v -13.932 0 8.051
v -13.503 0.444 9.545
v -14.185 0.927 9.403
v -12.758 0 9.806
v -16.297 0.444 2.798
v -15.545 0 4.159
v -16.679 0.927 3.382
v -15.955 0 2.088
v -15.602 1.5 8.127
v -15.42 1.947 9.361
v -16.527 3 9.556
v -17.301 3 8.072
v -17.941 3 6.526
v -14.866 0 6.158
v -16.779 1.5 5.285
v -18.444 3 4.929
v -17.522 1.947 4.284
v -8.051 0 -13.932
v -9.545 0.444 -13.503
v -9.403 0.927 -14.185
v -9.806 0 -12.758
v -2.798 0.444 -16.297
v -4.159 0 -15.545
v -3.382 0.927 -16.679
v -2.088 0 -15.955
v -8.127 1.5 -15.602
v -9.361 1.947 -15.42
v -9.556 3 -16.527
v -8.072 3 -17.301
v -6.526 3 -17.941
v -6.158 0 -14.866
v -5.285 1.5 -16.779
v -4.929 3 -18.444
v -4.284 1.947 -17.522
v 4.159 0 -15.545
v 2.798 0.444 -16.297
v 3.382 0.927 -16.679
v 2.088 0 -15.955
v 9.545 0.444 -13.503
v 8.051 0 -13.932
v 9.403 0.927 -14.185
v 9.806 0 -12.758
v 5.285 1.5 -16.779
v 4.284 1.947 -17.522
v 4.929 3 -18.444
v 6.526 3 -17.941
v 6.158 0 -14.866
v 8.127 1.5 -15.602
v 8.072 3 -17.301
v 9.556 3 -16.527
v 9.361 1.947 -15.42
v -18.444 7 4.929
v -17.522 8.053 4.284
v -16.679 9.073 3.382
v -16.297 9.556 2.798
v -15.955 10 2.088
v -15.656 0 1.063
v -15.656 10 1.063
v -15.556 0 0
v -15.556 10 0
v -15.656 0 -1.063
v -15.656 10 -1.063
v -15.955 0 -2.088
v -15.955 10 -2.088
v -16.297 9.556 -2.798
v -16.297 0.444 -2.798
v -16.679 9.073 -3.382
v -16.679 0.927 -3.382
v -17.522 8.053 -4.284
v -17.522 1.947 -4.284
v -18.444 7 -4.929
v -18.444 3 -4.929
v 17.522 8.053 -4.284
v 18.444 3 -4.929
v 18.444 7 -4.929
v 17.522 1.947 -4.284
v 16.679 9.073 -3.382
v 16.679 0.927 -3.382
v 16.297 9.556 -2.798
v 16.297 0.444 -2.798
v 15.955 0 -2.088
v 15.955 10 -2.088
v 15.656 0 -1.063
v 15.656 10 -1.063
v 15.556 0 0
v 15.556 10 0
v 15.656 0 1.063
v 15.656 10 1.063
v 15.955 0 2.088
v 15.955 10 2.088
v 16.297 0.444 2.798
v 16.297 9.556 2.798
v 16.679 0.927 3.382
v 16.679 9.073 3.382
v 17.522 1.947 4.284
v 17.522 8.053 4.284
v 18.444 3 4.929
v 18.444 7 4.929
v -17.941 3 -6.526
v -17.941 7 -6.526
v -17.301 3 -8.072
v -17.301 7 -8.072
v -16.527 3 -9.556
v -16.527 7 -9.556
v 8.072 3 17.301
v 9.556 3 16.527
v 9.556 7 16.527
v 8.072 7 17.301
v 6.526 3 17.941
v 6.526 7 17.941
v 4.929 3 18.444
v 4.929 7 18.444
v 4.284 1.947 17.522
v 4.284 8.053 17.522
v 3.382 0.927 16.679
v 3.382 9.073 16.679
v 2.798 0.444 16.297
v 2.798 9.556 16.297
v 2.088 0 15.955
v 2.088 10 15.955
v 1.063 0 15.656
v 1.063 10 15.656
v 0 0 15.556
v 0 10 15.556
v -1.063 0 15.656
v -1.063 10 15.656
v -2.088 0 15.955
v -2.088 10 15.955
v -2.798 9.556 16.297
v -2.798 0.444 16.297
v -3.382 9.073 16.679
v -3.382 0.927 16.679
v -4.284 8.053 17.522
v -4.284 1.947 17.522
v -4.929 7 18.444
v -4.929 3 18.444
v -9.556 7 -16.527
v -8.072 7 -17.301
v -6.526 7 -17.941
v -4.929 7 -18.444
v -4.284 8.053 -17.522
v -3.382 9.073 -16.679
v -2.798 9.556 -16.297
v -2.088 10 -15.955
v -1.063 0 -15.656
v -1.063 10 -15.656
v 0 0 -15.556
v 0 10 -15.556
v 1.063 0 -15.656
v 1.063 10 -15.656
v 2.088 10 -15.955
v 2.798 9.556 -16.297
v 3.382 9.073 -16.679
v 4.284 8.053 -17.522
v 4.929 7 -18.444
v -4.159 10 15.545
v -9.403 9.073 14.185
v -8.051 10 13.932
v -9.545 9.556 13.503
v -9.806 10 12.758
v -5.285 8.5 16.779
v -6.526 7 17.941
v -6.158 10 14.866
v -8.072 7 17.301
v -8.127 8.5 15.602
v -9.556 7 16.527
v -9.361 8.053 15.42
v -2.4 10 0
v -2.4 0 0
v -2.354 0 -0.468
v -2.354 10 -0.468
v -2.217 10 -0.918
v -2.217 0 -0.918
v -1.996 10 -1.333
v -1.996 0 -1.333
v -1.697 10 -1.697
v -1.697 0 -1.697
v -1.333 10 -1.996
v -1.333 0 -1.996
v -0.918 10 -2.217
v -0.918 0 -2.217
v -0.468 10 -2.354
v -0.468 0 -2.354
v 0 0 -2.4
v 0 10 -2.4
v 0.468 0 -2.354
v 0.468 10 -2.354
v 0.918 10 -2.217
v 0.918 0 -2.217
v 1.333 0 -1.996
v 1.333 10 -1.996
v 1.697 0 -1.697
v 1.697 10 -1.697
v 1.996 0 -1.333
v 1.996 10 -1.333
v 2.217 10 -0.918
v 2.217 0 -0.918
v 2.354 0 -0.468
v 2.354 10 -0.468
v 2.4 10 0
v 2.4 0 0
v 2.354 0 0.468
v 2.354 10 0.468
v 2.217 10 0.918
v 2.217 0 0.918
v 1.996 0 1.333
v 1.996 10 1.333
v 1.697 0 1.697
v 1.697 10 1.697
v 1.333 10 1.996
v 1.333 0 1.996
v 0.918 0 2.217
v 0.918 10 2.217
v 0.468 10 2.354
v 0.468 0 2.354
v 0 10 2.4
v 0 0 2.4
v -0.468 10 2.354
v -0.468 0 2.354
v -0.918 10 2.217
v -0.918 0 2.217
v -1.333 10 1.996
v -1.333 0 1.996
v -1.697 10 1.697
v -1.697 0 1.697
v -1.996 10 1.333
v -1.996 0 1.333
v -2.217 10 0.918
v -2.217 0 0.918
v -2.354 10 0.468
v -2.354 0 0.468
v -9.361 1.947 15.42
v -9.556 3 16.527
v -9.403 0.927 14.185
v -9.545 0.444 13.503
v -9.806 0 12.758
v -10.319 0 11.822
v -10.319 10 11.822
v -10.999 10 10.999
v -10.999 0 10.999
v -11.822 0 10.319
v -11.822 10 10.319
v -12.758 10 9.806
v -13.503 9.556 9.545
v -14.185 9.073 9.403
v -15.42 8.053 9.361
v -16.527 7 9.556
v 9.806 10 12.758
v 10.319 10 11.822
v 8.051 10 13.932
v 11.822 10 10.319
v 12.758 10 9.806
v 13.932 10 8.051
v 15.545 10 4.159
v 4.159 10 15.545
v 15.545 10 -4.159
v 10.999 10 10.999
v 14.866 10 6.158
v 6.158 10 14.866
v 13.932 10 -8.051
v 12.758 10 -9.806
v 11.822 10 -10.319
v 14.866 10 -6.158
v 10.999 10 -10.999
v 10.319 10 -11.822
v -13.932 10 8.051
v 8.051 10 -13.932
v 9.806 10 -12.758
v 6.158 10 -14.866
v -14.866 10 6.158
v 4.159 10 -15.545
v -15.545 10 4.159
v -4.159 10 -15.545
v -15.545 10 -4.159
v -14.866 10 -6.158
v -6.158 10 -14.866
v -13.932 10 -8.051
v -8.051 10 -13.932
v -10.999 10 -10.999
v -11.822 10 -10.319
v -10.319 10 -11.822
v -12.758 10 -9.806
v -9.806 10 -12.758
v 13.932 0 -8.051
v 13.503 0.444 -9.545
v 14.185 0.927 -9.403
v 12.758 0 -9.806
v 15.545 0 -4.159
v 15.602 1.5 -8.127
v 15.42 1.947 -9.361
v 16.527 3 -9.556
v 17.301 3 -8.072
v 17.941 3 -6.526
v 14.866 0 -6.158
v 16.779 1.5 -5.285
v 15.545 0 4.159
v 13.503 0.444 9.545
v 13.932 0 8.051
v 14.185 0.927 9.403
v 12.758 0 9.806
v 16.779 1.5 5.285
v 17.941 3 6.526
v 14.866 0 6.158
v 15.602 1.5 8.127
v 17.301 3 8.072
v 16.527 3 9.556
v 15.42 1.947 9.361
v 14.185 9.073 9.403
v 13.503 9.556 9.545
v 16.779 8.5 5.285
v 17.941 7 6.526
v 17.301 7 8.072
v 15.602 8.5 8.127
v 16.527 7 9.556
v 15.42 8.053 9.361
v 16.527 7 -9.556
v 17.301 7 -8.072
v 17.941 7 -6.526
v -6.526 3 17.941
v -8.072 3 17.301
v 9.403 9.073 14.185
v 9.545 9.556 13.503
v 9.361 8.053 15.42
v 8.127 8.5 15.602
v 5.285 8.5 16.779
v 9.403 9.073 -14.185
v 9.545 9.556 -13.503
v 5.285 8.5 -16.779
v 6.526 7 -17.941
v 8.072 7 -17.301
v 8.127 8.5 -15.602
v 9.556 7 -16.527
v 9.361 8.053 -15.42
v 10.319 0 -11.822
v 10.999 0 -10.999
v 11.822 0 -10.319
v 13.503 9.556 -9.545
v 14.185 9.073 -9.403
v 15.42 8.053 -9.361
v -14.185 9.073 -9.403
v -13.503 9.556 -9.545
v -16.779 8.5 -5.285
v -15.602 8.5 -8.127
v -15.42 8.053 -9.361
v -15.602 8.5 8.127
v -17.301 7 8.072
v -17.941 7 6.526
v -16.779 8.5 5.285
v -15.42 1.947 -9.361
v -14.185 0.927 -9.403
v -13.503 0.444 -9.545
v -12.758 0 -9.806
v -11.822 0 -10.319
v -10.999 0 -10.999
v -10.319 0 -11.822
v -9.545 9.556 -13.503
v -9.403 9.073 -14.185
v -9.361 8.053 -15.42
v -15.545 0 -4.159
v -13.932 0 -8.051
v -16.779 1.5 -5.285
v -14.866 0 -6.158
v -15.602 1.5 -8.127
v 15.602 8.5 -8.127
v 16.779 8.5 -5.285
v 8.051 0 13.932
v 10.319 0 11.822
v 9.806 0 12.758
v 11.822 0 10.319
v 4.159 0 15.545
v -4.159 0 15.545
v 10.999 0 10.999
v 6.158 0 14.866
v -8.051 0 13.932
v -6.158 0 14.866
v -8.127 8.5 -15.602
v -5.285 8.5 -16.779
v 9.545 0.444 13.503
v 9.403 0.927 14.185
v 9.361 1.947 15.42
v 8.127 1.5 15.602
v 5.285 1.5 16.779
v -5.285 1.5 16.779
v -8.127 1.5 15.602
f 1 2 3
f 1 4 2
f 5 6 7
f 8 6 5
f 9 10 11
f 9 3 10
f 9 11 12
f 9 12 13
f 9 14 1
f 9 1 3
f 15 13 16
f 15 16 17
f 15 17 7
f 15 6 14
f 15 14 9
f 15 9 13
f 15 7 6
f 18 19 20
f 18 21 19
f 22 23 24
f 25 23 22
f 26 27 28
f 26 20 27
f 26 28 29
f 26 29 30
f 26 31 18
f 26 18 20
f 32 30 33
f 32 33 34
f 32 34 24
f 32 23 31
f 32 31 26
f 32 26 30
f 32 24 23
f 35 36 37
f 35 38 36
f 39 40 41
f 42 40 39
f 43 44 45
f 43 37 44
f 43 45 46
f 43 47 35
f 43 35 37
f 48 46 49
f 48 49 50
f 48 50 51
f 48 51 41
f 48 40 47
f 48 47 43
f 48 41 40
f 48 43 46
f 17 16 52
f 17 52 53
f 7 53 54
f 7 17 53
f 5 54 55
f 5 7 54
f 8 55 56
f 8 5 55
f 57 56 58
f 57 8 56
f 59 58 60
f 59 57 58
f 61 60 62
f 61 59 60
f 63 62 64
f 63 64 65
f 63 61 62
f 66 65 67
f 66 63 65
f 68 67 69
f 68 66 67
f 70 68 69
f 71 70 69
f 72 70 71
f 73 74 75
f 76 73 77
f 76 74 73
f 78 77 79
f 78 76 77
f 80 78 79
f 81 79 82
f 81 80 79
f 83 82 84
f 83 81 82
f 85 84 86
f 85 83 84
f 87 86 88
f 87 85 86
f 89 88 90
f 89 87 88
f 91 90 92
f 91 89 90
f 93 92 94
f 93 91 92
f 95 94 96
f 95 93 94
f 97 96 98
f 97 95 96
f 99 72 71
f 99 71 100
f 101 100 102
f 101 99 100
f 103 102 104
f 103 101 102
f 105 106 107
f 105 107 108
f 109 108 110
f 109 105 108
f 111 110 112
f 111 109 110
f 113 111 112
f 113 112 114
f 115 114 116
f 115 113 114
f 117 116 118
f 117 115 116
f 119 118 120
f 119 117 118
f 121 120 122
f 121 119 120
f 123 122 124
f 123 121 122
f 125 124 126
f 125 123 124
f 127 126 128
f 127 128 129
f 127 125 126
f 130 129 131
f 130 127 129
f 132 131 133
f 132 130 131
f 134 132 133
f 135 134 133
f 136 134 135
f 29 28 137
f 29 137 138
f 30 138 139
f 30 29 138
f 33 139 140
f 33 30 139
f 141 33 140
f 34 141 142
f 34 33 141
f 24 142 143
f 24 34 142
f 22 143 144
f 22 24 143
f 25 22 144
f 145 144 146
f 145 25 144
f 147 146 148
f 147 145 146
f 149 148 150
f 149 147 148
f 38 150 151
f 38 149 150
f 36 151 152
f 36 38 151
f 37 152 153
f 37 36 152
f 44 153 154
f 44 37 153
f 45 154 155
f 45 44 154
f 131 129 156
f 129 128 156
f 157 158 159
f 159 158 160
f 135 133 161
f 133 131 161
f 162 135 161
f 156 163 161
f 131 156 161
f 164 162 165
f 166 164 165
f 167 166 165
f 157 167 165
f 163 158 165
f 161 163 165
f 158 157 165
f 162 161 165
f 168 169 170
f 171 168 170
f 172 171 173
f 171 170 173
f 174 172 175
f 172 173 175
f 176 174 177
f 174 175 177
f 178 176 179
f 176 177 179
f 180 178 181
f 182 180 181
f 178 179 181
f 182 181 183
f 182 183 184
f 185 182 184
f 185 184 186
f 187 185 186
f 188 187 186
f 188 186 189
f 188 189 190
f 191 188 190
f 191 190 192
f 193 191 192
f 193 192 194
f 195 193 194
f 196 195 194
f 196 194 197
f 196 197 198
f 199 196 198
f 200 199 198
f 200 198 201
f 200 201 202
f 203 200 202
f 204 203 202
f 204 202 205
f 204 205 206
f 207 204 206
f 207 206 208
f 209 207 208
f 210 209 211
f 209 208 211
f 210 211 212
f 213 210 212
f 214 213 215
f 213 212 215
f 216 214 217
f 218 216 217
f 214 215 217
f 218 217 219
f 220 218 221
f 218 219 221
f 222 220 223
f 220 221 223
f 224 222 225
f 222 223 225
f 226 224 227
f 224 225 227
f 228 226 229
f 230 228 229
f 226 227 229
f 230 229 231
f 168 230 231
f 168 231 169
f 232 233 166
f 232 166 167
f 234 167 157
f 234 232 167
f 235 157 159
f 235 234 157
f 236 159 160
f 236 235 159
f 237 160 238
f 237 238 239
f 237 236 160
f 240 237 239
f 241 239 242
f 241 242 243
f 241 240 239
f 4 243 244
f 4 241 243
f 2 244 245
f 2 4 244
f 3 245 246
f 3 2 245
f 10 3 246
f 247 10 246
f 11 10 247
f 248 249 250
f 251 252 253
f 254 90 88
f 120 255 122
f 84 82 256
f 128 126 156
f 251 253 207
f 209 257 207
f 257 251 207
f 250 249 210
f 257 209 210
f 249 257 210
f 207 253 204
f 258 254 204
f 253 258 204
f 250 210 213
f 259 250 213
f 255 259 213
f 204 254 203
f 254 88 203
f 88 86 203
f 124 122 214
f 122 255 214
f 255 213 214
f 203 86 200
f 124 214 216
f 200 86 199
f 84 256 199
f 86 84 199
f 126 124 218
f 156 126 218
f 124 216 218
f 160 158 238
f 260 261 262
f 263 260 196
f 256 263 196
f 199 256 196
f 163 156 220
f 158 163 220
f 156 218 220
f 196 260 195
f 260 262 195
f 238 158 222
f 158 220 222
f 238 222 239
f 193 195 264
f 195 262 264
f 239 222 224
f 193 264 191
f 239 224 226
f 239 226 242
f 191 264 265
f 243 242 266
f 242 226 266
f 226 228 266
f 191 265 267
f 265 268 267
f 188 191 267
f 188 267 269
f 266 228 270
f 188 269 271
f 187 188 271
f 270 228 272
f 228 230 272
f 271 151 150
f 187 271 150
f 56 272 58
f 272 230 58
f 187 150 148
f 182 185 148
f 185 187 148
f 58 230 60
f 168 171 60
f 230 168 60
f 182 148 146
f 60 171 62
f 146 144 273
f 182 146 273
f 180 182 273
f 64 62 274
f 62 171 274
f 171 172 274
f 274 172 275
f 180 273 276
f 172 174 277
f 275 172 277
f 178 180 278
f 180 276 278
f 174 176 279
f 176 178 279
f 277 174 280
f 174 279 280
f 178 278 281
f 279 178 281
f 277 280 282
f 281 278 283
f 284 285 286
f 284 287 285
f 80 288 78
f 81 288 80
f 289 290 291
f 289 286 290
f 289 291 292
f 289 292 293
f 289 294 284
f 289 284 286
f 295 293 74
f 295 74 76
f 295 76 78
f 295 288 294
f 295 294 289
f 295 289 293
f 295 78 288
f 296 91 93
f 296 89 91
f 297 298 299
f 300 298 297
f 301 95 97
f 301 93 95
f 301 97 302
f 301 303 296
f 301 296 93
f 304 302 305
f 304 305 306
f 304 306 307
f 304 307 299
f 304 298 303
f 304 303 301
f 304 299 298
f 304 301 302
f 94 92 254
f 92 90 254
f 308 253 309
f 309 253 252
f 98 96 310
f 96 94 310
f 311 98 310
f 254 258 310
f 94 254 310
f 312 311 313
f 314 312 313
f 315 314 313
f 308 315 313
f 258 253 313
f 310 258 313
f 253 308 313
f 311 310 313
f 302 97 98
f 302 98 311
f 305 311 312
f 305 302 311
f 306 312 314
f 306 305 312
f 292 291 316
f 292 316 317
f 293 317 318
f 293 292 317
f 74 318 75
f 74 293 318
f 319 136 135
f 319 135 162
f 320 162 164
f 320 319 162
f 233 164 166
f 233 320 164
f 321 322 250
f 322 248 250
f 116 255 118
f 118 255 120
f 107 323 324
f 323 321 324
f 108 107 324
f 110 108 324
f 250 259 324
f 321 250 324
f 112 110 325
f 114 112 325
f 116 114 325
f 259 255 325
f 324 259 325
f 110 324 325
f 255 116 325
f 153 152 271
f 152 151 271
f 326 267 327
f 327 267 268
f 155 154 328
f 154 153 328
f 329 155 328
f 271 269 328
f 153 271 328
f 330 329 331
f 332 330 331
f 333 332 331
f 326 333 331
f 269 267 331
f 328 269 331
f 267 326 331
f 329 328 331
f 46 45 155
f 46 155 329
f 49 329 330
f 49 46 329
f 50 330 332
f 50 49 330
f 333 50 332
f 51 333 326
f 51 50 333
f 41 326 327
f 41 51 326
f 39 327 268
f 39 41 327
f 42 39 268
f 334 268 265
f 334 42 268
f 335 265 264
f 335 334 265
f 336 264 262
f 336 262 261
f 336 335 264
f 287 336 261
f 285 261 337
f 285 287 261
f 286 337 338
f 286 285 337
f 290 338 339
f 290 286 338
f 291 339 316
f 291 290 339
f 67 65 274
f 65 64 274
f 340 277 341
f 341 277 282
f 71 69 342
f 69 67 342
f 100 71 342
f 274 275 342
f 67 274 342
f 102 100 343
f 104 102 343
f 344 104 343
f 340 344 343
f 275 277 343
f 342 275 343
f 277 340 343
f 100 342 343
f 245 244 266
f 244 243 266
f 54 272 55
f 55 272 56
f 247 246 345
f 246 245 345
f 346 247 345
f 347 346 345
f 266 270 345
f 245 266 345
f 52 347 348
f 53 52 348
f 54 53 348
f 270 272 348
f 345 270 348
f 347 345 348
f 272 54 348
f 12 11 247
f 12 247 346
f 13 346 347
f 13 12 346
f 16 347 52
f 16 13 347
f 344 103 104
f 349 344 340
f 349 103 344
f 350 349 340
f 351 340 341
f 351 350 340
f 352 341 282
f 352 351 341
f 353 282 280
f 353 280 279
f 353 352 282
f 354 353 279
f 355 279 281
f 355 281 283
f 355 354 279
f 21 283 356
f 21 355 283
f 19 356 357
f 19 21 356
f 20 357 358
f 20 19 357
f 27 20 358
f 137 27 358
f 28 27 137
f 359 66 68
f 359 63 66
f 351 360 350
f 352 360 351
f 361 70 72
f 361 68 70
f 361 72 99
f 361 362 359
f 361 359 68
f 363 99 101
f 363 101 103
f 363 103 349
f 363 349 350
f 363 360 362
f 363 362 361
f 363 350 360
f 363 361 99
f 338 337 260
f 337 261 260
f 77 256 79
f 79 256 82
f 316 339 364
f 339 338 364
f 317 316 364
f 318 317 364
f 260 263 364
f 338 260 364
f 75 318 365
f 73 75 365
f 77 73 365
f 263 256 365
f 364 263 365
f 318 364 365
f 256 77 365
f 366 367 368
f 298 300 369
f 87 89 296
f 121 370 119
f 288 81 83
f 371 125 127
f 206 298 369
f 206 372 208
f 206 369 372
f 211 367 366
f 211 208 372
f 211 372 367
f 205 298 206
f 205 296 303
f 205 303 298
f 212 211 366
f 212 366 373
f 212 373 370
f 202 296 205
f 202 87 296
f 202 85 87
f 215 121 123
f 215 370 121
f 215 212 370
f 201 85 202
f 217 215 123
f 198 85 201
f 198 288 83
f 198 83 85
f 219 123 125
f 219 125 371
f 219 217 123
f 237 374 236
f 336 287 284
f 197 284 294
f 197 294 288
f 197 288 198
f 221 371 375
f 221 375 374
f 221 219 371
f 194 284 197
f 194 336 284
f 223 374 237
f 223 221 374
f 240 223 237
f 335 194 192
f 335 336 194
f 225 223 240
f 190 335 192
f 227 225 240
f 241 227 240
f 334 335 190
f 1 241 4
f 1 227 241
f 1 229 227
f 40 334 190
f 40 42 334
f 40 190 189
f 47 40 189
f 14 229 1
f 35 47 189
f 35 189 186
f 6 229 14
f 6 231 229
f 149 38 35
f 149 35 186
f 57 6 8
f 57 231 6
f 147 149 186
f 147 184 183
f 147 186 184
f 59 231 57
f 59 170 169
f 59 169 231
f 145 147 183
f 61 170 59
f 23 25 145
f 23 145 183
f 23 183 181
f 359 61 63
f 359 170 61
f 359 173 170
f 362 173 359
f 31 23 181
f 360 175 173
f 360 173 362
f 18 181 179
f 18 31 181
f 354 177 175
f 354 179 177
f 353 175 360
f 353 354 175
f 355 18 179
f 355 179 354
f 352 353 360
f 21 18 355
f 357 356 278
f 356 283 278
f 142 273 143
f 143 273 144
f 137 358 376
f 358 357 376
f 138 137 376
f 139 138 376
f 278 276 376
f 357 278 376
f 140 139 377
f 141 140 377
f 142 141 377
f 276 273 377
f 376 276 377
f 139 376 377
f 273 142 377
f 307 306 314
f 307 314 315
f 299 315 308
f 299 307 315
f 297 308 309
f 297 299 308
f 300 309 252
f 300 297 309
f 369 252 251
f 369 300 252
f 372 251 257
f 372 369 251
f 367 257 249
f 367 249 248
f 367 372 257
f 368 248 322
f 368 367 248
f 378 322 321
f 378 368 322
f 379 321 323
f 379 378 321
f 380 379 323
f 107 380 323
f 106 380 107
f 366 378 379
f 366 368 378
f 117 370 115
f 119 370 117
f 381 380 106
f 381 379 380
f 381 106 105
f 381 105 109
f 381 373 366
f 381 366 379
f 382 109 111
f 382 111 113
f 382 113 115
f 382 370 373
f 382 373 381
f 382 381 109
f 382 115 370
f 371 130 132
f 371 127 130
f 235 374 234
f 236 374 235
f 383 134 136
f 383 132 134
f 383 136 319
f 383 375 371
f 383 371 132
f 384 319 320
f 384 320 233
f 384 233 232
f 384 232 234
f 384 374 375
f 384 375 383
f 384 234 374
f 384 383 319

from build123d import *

# Parameters (mm, degrees)
BOSS_EXTRUDE1_DEPTH  = 10
CHAMFER1_SIZE        = 3
M4_CLEARANCE_HOLE1_D = 4.8


with BuildPart() as part:
    # Sketch1 → Boss-Extrude1 (new body)
    with BuildSketch(Plane(origin=(0, 0, 0), x_dir=(1, 0, 0), z_dir=(0, 1, 0))):
        with BuildLine():
            ThreePointArc((4.929173178, -18.444040543), (0, -15.55551692), (-4.929173178, -18.444040543))
            ThreePointArc((-4.929173178, -18.444040543), (-7.30594069, -17.6381011), (-9.556454361, -16.527357921))
            ThreePointArc((-9.556454361, -16.527357921), (-10.999411499, -10.999411499), (-16.527357921, -9.556454361))
            ThreePointArc((-16.527357921, -9.556454361), (-17.6381011, -7.30594069), (-18.444040543, -4.929173178))
            ThreePointArc((-18.444040543, -4.929173178), (-15.55551692, 0), (-18.444040543, 4.929173178))
            ThreePointArc((-18.444040543, 4.929173178), (-17.6381011, 7.30594069), (-16.527357921, 9.556454361))
            ThreePointArc((-16.527357921, 9.556454361), (-10.999411499, 10.999411499), (-9.556454361, 16.527357921))
            ThreePointArc((-9.556454361, 16.527357921), (-7.30594069, 17.6381011), (-4.929173178, 18.444040543))
            ThreePointArc((-4.929173178, 18.444040543), (0, 15.55551692), (4.929173178, 18.444040543))
            ThreePointArc((4.929173178, 18.444040543), (7.30594069, 17.6381011), (9.556454361, 16.527357921))
            ThreePointArc((9.556454361, 16.527357921), (10.999411499, 10.999411499), (16.527357921, 9.556454361))
            ThreePointArc((16.527357921, 9.556454361), (17.6381011, 7.30594069), (18.444040543, 4.929173178))
            ThreePointArc((18.444040543, 4.929173178), (15.55551692, 0), (18.444040543, -4.929173178))
            ThreePointArc((18.444040543, -4.929173178), (17.6381011, -7.30594069), (16.527357921, -9.556454361))
            ThreePointArc((16.527357921, -9.556454361), (10.999411499, -10.999411499), (9.556454361, -16.527357921))
            ThreePointArc((9.556454361, -16.527357921), (7.30594069, -17.6381011), (4.929173178, -18.444040543))
        make_face()
    extrude(amount=BOSS_EXTRUDE1_DEPTH)

    # Chamfer1
    chamfer1_edges = [part.edges().sort_by_distance(p)[0] for p in [
        (7.30594069, 10, -17.6381011),
        (17.6381011, 0, 7.30594069),
        (7.30594069, 0, 17.6381011),
        (-7.30594069, 0, 17.6381011),
        (-17.6381011, 0, 7.30594069),
        (-17.6381011, 0, -7.30594069),
        (-7.30594069, 0, -17.6381011),
        (-7.30594069, 10, -17.6381011),
        (7.30594069, 0, -17.6381011),
        (17.6381011, 0, -7.30594069),
        (-17.6381011, 10, -7.30594069),
        (-17.6381011, 10, 7.30594069),
        (-7.30594069, 10, 17.6381011),
        (17.6381011, 10, -7.30594069),
        (7.30594069, 10, 17.6381011),
        (17.6381011, 10, 7.30594069),
    ]]
    chamfer(chamfer1_edges, length=CHAMFER1_SIZE)

    # M4 Clearance Hole1 (through all)
    with Locations(Plane(origin=(0, 10, 0), x_dir=(1, 0, 0), z_dir=(0, 1, 0))):
        with Locations((0, 0)):
            Hole(M4_CLEARANCE_HOLE1_D / 2)


solid = part.part
